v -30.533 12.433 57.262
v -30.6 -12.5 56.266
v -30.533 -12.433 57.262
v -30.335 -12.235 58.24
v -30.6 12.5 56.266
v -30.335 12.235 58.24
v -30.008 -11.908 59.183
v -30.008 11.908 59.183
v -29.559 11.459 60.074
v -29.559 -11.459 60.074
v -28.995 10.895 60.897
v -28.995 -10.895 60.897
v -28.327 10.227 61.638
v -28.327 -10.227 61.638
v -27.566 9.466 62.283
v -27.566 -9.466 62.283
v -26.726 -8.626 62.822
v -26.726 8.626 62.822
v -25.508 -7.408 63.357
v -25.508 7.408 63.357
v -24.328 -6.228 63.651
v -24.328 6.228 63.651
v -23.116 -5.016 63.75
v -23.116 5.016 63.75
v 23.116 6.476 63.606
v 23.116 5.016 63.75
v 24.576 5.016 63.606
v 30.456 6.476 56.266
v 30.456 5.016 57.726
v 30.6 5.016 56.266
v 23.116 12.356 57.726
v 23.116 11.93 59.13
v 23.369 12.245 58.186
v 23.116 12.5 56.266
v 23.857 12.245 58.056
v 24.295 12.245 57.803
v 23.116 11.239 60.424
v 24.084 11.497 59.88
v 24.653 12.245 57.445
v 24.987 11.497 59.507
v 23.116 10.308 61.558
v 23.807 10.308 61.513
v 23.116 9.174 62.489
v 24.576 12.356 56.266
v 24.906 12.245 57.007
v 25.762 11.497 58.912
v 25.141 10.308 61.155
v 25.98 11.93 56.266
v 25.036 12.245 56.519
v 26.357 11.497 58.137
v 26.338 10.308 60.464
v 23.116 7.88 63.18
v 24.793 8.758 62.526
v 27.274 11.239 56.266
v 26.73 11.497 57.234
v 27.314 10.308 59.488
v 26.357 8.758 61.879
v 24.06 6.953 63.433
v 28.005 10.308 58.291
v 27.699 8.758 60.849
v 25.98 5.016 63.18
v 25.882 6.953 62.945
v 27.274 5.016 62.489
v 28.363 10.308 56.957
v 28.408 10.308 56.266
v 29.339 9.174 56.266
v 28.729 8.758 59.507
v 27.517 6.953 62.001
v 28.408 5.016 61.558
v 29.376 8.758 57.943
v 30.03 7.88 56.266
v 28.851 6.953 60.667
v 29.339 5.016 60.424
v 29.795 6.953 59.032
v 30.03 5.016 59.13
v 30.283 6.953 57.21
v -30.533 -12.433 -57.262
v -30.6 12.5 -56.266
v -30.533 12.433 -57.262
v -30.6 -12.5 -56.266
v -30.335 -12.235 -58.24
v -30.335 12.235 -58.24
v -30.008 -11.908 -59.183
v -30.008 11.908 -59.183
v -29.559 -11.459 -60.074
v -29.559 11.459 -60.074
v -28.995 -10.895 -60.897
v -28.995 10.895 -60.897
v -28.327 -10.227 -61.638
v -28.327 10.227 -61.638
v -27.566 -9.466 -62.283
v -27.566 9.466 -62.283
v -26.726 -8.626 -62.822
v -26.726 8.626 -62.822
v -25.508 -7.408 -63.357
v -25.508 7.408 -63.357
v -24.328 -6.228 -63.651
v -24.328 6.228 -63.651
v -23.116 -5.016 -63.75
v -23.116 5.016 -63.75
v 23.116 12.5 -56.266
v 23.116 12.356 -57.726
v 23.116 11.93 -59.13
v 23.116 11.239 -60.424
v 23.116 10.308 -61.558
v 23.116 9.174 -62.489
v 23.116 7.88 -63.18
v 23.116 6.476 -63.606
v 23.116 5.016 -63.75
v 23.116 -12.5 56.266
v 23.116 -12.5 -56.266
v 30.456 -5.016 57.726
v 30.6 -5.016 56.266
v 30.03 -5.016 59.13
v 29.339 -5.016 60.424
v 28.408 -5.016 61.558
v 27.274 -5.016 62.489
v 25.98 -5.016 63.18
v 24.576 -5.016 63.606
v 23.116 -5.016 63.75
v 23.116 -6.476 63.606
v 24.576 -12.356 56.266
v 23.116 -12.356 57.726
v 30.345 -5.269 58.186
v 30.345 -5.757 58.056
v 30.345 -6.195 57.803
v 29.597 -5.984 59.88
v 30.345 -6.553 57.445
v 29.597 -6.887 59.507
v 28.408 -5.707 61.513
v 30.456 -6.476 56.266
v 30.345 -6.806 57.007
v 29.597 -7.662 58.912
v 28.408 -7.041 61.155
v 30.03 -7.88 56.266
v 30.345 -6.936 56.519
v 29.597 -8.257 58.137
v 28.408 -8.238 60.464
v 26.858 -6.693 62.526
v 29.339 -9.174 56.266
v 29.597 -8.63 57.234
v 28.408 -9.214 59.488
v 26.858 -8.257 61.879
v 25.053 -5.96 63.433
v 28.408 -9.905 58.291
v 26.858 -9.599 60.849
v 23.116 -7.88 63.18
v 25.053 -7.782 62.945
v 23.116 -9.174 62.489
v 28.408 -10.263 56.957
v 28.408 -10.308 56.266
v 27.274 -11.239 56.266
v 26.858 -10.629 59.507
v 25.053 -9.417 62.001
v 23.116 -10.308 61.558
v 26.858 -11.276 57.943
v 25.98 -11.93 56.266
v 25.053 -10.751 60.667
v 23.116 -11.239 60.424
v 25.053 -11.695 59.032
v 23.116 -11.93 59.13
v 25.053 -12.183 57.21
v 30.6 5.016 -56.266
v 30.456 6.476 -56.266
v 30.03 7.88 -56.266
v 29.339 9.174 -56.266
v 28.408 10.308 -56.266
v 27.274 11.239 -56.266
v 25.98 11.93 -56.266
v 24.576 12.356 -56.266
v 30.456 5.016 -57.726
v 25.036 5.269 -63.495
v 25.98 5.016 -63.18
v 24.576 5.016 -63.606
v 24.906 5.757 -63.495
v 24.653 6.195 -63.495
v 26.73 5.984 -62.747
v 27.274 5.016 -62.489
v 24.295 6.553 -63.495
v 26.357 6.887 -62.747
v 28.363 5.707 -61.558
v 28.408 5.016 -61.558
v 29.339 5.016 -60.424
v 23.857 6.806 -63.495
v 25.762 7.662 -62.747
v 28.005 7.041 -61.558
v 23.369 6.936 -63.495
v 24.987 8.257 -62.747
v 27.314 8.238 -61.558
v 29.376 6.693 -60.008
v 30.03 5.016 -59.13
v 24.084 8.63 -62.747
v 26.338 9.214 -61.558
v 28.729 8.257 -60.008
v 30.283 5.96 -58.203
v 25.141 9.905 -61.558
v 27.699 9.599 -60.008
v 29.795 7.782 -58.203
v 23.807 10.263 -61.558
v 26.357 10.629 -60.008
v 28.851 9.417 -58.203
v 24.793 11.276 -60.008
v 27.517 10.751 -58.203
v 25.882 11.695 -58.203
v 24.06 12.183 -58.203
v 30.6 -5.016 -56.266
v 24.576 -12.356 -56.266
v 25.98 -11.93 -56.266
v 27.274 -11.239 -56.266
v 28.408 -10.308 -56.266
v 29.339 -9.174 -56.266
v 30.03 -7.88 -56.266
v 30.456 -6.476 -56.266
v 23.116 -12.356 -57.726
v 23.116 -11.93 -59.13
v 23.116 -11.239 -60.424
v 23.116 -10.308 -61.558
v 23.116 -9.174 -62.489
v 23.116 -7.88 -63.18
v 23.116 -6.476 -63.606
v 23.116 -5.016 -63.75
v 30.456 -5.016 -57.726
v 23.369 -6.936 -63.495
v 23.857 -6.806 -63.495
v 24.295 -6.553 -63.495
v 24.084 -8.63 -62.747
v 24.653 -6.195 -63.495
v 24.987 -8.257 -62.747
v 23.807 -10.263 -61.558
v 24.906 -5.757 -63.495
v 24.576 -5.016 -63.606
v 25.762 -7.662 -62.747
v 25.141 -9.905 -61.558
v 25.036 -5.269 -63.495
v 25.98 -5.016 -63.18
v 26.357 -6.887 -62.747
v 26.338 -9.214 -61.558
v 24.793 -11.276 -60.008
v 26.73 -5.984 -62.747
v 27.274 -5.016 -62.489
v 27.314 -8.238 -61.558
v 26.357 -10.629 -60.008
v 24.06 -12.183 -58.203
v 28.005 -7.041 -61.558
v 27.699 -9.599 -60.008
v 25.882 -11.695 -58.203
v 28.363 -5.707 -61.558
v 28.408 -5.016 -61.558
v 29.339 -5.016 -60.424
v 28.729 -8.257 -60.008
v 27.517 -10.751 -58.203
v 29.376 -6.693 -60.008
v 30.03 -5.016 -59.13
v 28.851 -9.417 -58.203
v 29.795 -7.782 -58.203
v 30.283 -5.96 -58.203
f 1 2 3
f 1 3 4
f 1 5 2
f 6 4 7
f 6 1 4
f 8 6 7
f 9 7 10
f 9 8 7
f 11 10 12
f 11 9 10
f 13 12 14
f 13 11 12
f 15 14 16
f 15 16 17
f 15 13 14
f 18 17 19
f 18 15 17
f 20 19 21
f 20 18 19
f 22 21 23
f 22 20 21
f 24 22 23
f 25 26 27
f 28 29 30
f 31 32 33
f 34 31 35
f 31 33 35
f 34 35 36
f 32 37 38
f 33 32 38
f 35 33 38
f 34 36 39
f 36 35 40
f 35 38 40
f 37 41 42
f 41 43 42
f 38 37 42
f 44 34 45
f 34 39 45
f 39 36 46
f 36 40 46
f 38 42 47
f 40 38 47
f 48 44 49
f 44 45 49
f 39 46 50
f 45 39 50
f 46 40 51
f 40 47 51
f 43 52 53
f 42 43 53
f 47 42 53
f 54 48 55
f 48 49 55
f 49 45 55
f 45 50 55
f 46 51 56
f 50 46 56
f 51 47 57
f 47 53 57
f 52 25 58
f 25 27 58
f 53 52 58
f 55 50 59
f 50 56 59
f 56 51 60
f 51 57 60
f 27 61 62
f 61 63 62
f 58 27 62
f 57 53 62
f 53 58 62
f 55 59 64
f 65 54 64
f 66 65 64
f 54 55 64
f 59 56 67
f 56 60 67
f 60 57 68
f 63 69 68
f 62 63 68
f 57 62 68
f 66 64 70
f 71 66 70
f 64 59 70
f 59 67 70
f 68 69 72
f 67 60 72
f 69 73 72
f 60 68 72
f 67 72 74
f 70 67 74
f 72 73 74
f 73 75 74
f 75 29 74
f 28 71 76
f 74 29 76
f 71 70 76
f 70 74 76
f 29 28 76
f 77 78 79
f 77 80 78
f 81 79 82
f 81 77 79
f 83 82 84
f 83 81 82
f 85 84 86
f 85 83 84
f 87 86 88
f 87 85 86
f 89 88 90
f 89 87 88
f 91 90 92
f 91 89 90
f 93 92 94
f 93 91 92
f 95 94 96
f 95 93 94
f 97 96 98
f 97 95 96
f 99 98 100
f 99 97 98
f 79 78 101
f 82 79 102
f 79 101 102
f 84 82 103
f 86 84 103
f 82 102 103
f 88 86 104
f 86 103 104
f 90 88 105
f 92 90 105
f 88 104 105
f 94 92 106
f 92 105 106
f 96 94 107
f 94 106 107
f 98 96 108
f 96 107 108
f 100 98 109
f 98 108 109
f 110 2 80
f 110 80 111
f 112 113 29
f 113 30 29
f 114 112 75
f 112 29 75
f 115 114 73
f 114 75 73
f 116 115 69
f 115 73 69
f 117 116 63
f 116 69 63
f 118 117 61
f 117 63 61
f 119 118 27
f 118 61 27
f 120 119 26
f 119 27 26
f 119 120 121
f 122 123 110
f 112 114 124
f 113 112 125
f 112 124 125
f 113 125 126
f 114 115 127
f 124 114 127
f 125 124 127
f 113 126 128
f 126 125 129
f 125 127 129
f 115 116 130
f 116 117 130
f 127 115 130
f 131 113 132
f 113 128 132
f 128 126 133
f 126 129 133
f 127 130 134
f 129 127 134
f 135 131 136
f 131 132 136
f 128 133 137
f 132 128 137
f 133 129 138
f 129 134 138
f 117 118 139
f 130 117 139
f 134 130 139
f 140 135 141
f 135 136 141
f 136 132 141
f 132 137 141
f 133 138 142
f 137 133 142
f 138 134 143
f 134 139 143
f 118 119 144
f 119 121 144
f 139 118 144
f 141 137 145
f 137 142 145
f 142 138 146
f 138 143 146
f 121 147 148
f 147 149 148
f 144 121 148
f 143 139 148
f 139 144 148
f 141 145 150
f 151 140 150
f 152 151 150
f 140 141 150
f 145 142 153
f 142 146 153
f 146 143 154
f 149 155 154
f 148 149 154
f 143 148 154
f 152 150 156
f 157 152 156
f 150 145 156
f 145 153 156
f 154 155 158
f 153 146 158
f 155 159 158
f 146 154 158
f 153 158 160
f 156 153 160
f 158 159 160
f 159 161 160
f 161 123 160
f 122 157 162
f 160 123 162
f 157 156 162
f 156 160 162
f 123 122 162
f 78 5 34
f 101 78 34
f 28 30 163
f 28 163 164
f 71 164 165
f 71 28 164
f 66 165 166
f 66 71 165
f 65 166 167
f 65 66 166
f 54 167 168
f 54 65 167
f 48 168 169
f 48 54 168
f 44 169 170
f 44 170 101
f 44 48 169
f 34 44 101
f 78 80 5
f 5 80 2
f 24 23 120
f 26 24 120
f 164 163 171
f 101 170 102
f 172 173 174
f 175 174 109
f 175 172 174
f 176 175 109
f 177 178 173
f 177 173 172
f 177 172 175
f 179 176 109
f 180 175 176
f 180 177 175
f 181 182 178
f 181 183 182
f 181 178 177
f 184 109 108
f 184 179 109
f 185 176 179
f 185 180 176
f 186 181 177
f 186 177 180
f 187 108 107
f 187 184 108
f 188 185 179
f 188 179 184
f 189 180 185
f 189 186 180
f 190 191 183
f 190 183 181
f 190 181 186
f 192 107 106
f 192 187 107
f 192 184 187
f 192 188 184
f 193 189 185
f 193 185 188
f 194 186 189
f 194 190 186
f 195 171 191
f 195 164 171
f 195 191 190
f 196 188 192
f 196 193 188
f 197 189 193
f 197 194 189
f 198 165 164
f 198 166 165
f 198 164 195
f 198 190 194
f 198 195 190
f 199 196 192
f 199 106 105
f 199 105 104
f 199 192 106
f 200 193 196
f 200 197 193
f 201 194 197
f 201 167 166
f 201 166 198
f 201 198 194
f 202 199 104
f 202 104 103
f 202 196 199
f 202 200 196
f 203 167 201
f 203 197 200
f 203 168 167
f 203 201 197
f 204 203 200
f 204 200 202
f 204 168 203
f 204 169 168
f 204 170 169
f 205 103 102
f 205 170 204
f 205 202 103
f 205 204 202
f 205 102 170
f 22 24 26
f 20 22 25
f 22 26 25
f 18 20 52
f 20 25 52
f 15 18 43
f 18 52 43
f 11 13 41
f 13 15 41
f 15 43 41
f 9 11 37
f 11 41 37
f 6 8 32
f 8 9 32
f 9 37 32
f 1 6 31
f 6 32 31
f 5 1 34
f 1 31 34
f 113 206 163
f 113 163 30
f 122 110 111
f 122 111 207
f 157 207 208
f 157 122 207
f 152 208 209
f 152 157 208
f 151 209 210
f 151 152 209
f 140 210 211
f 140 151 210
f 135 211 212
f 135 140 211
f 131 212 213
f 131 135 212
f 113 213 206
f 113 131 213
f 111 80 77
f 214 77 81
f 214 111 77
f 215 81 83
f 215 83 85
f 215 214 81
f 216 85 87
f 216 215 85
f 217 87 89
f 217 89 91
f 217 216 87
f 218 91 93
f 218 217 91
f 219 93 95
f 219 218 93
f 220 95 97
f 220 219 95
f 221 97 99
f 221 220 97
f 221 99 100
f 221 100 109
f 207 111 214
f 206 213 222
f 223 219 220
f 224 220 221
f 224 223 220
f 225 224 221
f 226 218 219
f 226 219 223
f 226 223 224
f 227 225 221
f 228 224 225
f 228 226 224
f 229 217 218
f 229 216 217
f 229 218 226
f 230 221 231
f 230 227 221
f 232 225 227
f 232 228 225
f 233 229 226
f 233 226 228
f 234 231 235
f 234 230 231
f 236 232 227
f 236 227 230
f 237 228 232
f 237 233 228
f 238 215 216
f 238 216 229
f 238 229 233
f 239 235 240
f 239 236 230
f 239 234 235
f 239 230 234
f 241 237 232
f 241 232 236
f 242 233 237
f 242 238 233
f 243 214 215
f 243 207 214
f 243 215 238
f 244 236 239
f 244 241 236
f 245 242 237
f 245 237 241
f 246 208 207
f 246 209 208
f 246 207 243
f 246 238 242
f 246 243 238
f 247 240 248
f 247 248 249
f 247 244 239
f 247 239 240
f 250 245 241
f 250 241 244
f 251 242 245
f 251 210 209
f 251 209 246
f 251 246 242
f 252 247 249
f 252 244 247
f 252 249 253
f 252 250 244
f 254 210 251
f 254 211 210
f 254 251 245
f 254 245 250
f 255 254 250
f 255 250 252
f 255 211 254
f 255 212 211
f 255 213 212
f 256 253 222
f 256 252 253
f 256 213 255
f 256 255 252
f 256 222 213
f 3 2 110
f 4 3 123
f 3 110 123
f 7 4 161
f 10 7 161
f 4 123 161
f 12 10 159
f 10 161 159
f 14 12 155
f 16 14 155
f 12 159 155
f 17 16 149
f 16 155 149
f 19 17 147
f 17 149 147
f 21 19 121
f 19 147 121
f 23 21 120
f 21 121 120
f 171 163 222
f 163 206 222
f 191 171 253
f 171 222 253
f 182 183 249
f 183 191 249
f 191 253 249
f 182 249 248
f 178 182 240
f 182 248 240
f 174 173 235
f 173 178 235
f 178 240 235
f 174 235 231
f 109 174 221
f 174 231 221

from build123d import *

# Parameters (mm, degrees)
F0_W     = 61.199996
F0_H     = 127.500012
F1_DEPTH = 12.5
F2_R     = 7.484062


with BuildPart() as f1:
    # F0 (on Front) → F1 (new body, symmetric)
    with BuildSketch(Plane.XZ):
        Rectangle(F0_W, F0_H)
    extrude(amount=F1_DEPTH, both=True)

    # F2
    f2_edges = [f1.edges().sort_by_distance(p)[0] for p in [
        (-30.599998, 0, 63.750006),
        (0, -12.5, 63.750006),
        (30.599998, 0, 63.750006),
        (0, 12.5, 63.750006),
        (30.599998, -12.5, 0),
        (30.599998, 12.5, 0),
        (0, -12.5, -63.750006),
        (30.599998, 0, -63.750006),
        (0, 12.5, -63.750006),
        (-30.599998, 0, -63.750006),
    ]]
    fillet(f2_edges, radius=F2_R)


solid = f1.part
